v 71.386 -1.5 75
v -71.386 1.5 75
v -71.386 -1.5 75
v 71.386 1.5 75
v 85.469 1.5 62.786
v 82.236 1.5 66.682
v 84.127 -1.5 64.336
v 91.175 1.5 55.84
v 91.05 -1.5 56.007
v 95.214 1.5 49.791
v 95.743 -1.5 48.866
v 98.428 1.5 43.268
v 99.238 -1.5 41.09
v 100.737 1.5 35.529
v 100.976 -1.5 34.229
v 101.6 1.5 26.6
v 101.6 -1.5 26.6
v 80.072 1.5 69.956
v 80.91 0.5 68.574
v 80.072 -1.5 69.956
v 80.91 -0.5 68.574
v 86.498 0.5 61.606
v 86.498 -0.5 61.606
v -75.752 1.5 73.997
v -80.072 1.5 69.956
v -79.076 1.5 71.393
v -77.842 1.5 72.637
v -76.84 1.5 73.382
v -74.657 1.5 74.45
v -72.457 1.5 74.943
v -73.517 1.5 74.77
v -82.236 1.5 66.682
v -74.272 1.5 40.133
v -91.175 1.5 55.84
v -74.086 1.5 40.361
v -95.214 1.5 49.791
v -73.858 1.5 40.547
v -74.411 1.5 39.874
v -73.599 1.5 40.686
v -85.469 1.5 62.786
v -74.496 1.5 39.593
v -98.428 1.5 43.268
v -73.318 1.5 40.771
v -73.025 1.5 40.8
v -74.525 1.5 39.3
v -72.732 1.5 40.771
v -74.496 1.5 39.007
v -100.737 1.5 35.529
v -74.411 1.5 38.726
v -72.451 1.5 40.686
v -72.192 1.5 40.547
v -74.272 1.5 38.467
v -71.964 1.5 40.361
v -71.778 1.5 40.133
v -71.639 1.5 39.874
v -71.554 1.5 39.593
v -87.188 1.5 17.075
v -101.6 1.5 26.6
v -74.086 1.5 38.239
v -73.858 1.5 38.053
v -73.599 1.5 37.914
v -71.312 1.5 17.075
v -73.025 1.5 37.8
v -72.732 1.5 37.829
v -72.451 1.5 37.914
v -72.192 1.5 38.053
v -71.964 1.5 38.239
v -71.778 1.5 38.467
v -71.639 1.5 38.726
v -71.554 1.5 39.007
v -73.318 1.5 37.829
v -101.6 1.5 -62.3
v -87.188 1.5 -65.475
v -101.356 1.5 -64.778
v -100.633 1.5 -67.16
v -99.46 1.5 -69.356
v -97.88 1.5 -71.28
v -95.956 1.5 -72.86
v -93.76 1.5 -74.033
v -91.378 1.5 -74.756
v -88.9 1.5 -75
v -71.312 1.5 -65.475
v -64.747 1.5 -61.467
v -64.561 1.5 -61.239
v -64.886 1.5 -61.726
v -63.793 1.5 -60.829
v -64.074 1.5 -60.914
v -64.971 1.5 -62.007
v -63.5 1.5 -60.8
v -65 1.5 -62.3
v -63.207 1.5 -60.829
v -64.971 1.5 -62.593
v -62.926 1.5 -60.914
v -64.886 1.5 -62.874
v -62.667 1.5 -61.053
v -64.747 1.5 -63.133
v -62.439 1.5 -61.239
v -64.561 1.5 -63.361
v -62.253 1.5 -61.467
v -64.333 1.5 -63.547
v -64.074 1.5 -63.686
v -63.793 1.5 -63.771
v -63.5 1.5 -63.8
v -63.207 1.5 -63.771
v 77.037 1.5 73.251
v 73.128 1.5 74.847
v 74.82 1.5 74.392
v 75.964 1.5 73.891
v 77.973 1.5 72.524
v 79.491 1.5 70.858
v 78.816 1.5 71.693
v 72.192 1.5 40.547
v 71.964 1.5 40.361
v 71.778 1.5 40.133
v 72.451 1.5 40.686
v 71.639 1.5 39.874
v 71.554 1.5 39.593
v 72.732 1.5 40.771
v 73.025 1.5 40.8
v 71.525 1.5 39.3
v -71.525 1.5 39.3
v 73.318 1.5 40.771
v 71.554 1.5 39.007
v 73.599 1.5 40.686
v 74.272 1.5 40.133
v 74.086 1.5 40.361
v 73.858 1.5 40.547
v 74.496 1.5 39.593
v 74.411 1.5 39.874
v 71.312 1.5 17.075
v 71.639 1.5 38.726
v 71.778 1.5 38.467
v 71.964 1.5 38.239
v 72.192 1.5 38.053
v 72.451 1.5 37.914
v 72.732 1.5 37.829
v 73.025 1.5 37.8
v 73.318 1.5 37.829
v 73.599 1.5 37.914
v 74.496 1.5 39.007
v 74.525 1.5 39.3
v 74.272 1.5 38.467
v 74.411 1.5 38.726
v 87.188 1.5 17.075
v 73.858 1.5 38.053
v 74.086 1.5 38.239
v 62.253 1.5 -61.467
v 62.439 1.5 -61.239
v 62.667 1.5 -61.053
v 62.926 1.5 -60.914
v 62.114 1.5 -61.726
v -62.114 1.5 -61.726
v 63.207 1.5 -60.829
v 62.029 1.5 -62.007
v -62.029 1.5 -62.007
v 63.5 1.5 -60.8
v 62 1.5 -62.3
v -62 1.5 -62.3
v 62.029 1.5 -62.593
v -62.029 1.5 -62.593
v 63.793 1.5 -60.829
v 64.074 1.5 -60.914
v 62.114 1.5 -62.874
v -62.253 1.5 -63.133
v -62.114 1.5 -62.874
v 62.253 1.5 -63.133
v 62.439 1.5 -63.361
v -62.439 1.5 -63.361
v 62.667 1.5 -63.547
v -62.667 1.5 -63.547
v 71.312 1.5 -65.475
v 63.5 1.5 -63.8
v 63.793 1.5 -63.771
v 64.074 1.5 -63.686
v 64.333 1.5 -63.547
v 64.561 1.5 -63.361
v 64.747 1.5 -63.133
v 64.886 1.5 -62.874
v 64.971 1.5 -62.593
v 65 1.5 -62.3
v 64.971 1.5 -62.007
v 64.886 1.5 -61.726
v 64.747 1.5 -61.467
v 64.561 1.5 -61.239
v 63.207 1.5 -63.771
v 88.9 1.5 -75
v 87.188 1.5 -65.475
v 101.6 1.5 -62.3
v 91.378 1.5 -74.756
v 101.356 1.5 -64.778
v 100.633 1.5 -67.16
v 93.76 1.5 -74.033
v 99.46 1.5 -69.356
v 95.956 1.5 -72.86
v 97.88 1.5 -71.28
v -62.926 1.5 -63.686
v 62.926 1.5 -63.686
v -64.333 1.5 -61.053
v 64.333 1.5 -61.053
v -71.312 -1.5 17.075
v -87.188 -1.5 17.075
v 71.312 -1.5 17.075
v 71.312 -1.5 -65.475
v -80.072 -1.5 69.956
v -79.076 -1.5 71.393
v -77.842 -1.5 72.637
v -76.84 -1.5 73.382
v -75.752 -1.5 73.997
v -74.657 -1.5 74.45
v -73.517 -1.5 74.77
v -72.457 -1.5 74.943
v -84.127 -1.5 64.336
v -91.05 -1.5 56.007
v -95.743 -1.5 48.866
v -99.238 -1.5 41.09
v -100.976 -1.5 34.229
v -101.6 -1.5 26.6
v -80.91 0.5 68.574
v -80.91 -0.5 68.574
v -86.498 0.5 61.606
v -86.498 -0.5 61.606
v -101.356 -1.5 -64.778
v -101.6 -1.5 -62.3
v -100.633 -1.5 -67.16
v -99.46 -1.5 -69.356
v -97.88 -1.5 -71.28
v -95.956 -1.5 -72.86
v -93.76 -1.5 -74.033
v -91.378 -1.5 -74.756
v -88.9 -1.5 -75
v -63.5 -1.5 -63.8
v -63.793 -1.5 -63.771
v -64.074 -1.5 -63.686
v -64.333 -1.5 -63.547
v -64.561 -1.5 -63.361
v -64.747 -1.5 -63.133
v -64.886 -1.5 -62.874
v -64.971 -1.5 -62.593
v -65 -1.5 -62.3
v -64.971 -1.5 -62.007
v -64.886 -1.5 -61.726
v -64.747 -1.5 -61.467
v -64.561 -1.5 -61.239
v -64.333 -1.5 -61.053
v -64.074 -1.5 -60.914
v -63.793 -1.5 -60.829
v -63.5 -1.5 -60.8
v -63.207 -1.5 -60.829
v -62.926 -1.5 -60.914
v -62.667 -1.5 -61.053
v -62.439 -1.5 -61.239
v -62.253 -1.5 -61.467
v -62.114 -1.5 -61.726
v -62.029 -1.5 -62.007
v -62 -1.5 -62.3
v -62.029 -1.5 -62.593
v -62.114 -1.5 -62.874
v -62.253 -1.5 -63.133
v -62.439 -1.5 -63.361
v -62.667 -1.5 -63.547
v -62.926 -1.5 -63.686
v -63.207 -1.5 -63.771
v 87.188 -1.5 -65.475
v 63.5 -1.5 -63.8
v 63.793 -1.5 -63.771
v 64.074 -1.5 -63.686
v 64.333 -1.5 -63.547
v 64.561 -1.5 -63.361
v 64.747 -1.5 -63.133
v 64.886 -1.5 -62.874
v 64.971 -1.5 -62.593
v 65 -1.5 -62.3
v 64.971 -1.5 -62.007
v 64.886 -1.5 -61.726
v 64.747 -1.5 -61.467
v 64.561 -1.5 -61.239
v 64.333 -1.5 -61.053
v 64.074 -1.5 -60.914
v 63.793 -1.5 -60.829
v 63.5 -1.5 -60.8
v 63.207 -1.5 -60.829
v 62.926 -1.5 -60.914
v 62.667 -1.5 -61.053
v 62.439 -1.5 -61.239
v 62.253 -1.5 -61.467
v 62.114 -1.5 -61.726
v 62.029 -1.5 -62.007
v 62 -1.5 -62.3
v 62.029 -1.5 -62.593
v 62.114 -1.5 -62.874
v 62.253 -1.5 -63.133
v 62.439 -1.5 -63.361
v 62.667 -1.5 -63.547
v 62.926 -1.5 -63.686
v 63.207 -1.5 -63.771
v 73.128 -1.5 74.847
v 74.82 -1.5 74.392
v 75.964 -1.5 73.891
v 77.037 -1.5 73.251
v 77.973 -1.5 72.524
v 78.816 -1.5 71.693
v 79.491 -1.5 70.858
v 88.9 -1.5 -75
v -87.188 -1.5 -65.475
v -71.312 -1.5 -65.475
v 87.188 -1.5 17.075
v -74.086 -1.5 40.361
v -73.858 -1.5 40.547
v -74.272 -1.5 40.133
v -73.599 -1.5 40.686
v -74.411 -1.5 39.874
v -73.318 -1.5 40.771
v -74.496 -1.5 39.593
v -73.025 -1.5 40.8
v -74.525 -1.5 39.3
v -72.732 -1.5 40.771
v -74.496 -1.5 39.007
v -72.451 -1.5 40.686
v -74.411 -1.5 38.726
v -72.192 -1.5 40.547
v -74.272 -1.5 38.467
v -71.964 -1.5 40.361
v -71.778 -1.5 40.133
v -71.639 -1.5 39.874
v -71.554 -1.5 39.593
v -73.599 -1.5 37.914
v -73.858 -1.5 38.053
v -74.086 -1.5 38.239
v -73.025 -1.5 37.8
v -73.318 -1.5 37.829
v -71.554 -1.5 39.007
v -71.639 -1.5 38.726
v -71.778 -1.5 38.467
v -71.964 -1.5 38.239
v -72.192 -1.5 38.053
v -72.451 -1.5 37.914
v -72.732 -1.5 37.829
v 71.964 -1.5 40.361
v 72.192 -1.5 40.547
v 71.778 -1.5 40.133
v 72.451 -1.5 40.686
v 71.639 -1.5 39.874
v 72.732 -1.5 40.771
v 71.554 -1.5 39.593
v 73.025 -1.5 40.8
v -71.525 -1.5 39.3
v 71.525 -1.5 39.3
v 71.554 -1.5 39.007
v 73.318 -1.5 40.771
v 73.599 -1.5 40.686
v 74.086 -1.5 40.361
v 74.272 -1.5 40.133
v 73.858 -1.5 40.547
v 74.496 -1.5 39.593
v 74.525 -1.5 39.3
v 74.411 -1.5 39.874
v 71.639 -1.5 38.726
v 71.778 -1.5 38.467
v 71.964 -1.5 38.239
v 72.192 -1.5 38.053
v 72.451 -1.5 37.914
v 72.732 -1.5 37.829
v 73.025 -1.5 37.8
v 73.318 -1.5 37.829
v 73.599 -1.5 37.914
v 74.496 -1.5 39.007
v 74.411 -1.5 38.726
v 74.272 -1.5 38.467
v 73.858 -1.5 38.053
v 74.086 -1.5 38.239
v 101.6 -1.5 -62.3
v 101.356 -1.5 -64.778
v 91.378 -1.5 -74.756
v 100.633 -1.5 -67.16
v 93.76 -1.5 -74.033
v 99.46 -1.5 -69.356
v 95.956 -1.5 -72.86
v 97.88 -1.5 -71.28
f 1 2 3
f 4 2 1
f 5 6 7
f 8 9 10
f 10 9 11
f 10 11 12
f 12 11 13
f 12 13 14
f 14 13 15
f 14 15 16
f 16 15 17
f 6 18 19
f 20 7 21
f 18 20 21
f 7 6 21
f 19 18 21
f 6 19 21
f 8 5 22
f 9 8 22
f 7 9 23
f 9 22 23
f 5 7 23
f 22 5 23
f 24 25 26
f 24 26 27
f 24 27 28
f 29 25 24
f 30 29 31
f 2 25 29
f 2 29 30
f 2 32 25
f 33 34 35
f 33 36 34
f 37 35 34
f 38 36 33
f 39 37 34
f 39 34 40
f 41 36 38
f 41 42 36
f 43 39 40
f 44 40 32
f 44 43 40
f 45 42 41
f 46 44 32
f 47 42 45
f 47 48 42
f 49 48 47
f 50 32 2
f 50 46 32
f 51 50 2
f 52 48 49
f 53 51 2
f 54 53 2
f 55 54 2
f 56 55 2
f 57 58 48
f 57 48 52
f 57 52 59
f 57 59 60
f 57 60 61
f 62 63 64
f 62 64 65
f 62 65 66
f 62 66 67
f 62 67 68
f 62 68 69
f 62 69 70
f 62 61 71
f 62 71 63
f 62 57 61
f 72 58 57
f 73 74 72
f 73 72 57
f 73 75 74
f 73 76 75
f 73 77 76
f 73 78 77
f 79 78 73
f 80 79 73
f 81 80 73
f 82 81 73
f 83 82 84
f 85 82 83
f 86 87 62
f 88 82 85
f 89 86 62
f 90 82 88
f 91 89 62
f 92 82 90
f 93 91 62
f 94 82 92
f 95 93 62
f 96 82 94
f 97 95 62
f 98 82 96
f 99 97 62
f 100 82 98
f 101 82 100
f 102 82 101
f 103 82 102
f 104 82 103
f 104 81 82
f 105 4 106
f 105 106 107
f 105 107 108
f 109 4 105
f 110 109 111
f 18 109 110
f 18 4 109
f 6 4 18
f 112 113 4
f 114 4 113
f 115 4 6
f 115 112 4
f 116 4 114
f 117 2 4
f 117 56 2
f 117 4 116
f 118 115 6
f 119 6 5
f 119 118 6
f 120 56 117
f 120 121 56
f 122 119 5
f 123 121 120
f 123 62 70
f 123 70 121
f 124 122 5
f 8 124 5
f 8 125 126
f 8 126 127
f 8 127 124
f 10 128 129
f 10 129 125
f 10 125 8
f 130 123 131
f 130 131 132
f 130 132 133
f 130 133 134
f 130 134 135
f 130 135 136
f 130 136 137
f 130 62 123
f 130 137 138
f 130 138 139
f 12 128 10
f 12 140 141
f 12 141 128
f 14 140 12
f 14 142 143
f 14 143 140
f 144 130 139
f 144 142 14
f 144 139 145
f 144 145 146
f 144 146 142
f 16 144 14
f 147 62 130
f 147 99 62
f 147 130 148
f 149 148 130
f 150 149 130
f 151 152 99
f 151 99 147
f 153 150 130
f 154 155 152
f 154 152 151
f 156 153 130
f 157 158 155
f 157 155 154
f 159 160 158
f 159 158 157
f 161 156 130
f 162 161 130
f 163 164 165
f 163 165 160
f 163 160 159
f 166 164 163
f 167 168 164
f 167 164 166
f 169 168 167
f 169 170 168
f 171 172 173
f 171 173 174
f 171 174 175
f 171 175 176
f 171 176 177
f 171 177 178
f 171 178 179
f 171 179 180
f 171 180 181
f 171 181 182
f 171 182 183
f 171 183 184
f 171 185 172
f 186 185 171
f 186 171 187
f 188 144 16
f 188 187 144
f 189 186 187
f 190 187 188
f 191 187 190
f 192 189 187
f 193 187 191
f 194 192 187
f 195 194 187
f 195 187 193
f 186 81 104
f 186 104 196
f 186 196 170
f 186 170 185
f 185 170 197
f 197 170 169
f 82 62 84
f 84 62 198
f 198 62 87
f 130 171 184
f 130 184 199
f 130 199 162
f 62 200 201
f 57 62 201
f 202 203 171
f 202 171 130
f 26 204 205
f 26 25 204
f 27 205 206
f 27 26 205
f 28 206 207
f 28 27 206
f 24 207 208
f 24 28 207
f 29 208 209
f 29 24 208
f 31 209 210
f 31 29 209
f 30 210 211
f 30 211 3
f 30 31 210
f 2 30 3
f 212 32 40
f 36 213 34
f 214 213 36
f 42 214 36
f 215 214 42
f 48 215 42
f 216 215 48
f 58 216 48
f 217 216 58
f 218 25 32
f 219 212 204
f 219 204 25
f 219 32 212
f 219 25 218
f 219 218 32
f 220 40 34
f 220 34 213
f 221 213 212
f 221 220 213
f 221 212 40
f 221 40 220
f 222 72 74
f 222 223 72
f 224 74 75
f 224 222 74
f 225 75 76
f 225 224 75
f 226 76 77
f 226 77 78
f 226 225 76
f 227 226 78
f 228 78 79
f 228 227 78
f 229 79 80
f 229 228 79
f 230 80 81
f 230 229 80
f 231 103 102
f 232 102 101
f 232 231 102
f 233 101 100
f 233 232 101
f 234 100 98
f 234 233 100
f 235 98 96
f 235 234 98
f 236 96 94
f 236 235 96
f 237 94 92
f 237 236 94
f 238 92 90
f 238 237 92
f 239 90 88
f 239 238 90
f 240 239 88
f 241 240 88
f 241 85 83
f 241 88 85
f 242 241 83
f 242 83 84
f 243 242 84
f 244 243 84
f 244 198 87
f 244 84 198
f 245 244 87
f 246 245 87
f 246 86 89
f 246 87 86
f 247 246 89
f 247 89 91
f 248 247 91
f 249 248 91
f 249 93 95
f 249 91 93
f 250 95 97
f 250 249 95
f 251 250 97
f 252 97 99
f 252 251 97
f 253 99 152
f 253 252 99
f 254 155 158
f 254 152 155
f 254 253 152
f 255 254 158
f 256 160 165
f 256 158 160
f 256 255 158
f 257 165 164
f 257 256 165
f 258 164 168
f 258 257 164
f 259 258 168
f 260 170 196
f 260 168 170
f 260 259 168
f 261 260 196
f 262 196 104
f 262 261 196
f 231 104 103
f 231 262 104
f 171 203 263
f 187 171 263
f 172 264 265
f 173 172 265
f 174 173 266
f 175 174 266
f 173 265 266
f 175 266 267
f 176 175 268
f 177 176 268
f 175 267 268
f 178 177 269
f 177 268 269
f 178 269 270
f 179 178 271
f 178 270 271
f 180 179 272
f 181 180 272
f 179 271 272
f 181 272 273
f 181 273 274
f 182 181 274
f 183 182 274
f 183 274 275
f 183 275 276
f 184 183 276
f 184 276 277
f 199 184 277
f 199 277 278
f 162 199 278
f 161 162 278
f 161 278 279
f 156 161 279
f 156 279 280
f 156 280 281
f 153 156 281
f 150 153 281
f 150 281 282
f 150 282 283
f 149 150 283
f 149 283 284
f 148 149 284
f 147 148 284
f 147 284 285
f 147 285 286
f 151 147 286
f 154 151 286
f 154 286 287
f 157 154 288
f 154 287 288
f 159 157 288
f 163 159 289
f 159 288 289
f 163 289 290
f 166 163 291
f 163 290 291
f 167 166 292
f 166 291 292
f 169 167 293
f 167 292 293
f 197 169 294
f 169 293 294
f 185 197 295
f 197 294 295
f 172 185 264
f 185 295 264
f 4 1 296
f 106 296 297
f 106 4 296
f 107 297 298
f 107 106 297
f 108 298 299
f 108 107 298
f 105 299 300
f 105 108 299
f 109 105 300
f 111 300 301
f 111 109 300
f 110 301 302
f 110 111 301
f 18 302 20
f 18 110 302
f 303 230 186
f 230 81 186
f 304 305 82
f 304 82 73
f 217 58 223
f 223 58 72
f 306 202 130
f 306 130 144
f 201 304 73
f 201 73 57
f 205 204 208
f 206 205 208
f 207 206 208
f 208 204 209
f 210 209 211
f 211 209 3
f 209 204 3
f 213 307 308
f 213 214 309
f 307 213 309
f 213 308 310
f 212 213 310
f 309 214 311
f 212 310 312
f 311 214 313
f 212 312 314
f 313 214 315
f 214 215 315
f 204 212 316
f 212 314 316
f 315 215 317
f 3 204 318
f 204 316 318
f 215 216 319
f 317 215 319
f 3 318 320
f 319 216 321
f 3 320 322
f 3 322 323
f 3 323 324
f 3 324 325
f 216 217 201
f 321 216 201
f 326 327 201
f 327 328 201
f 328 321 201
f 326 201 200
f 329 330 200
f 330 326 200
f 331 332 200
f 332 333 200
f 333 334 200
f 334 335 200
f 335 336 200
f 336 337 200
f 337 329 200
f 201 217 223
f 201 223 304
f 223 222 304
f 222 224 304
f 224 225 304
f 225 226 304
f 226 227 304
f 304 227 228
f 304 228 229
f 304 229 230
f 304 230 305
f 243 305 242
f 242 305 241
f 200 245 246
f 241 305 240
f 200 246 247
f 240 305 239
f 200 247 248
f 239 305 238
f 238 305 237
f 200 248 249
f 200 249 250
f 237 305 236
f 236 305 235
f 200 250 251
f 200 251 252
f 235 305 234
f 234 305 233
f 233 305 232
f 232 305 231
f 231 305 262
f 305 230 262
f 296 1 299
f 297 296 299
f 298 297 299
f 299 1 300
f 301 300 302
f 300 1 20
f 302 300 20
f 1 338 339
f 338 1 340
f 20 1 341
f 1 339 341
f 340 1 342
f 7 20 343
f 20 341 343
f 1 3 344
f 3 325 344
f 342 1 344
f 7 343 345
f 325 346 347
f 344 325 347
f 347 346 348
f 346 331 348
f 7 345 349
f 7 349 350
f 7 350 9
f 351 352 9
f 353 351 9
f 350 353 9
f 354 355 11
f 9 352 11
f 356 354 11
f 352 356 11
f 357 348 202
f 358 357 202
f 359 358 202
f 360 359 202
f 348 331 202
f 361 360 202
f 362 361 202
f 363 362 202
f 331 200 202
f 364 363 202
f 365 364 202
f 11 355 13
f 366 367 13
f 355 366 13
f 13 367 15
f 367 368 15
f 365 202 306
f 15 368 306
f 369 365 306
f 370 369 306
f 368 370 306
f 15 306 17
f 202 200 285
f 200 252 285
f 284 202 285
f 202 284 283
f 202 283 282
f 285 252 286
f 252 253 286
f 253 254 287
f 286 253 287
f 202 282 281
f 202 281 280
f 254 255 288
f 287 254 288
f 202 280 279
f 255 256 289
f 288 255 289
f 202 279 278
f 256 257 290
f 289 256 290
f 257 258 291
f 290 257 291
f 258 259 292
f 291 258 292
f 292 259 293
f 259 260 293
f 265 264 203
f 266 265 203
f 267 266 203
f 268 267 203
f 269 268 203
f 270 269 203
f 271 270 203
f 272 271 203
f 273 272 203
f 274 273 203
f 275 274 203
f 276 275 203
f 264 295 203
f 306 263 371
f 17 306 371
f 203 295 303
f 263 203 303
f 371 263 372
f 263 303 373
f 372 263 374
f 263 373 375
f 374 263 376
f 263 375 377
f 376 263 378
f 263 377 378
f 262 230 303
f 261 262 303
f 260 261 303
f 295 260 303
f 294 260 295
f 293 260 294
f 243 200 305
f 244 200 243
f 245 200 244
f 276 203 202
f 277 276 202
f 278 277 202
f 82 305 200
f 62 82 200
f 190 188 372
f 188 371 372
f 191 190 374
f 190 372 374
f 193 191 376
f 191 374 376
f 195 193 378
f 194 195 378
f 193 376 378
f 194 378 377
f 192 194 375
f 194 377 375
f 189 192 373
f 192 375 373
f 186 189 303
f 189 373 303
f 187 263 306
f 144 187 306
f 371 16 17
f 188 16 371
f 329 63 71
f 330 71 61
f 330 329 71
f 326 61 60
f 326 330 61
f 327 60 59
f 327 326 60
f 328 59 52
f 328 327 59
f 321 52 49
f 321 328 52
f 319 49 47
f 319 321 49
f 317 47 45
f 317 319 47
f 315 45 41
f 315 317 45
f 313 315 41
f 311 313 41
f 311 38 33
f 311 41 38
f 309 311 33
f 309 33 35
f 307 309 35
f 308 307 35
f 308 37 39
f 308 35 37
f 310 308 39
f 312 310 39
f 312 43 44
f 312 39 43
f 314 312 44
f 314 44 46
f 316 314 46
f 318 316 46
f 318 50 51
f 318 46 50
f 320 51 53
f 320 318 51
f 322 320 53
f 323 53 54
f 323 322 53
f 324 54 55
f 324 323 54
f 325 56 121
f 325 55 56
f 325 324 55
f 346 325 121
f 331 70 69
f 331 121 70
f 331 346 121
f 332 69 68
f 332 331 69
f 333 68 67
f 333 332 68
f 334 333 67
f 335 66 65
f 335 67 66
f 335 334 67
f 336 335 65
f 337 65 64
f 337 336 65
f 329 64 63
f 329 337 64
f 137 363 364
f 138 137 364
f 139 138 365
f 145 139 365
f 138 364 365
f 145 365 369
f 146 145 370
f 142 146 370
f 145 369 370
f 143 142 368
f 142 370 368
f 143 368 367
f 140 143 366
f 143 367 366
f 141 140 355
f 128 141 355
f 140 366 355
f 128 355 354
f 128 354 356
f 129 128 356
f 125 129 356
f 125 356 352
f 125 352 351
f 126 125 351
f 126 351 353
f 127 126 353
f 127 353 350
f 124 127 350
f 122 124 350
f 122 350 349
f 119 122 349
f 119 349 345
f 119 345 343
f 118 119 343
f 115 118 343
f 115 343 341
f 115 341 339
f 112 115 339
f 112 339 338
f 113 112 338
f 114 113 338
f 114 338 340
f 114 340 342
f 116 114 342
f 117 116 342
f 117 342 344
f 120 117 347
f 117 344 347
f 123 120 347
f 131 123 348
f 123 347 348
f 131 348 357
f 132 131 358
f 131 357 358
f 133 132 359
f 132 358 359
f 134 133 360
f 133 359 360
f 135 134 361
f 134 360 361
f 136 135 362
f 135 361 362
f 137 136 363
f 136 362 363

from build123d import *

# Parameters (mm, degrees)
SKETCH1_W           = 203.2
SKETCH1_H           = 150
BOSS_EXTRUDE1_DEPTH = 1.5
FILLET1_R           = 12.7
SKETCH3_R           = 1.5
SKETCH3_W           = 15.875
SKETCH3_H           = 82.55
CUT_EXTRUDE2_DEPTH  = 127.319278022
CUT_EXTRUDE3_DEPTH  = 127.319278022
FILLET2_R           = 10


with BuildPart() as part:
    # Sketch1 → Boss-Extrude1 (new, symmetric)
    with BuildSketch(Plane(origin=(0, 0, 0), x_dir=(1, 0, 0), z_dir=(0, 1, 0))):
        Rectangle(SKETCH1_W, SKETCH1_H)
    extrude(amount=BOSS_EXTRUDE1_DEPTH, both=True)

    # Fillet1
    fillet1_edges = [part.edges().sort_by_distance(p)[0] for p in [
        (-101.6, 0, 75),
        (101.6, 0, 75),
        (101.6, 0, -75),
        (-101.6, 0, -75),
    ]]
    fillet(fillet1_edges, radius=FILLET1_R)

    # Sketch3 → Cut-Extrude2 (cut, through all)
    with BuildSketch(Plane.XZ.offset(1.5)):
        with Locations(Location((63.499999999, -62.3, 0), (0, 0, 270))):
            Circle(SKETCH3_R)
        with Locations(Location((73.024999999, 39.3, 0), (0, 0, 270))):
            Circle(SKETCH3_R)
        with Locations((79.25, -24.2)):
            Rectangle(SKETCH3_W, SKETCH3_H)
    cut_extrude2 = extrude(amount=-CUT_EXTRUDE2_DEPTH, mode=Mode.SUBTRACT)

    # Sketch4 → Cut-Extrude3 (cut, through all)
    with BuildSketch(Plane.XZ.offset(1.5)):
        with BuildLine():
            Line((101.6, 62.3), (101.6, 26.6))
            add(Edge.make_bspline(
                [(77.685809709, 75), (78.616134987, 72.645348103), (81.082482683, 67.616391475), (92.836364207, 54.857655975), (101.6, 41.84), (101.6, 26.6)],
                knots=[0.409925354, 0.409925354, 0.409925354, 0.409925354, 0.484619997, 0.584619997, 1, 1, 1, 1], degree=3))
            Line((77.685809709, 75), (88.9, 75))
            ThreePointArc((88.9, 75), (97.880256121, 71.280256121), (101.6, 62.3))
        make_face()
    cut_extrude3 = extrude(amount=-CUT_EXTRUDE3_DEPTH, mode=Mode.SUBTRACT)

    # Mirror1: Cut-Extrude2, Cut-Extrude3 across plane
    add(cut_extrude2.mirror(Plane(origin=(0, 0, 0), x_dir=(0, 0, 1), z_dir=(1, 0, 0))), mode=Mode.SUBTRACT)
    add(cut_extrude3.mirror(Plane(origin=(0, 0, 0), x_dir=(0, 0, 1), z_dir=(1, 0, 0))), mode=Mode.SUBTRACT)

    # Fillet2
    fillet2_edges = [part.edges().sort_by_distance(p)[0] for p in [
        (77.685809709, 0, 75),
        (-77.685809709, 0, 75),
    ]]
    fillet(fillet2_edges, radius=FILLET2_R)


solid = part.part
